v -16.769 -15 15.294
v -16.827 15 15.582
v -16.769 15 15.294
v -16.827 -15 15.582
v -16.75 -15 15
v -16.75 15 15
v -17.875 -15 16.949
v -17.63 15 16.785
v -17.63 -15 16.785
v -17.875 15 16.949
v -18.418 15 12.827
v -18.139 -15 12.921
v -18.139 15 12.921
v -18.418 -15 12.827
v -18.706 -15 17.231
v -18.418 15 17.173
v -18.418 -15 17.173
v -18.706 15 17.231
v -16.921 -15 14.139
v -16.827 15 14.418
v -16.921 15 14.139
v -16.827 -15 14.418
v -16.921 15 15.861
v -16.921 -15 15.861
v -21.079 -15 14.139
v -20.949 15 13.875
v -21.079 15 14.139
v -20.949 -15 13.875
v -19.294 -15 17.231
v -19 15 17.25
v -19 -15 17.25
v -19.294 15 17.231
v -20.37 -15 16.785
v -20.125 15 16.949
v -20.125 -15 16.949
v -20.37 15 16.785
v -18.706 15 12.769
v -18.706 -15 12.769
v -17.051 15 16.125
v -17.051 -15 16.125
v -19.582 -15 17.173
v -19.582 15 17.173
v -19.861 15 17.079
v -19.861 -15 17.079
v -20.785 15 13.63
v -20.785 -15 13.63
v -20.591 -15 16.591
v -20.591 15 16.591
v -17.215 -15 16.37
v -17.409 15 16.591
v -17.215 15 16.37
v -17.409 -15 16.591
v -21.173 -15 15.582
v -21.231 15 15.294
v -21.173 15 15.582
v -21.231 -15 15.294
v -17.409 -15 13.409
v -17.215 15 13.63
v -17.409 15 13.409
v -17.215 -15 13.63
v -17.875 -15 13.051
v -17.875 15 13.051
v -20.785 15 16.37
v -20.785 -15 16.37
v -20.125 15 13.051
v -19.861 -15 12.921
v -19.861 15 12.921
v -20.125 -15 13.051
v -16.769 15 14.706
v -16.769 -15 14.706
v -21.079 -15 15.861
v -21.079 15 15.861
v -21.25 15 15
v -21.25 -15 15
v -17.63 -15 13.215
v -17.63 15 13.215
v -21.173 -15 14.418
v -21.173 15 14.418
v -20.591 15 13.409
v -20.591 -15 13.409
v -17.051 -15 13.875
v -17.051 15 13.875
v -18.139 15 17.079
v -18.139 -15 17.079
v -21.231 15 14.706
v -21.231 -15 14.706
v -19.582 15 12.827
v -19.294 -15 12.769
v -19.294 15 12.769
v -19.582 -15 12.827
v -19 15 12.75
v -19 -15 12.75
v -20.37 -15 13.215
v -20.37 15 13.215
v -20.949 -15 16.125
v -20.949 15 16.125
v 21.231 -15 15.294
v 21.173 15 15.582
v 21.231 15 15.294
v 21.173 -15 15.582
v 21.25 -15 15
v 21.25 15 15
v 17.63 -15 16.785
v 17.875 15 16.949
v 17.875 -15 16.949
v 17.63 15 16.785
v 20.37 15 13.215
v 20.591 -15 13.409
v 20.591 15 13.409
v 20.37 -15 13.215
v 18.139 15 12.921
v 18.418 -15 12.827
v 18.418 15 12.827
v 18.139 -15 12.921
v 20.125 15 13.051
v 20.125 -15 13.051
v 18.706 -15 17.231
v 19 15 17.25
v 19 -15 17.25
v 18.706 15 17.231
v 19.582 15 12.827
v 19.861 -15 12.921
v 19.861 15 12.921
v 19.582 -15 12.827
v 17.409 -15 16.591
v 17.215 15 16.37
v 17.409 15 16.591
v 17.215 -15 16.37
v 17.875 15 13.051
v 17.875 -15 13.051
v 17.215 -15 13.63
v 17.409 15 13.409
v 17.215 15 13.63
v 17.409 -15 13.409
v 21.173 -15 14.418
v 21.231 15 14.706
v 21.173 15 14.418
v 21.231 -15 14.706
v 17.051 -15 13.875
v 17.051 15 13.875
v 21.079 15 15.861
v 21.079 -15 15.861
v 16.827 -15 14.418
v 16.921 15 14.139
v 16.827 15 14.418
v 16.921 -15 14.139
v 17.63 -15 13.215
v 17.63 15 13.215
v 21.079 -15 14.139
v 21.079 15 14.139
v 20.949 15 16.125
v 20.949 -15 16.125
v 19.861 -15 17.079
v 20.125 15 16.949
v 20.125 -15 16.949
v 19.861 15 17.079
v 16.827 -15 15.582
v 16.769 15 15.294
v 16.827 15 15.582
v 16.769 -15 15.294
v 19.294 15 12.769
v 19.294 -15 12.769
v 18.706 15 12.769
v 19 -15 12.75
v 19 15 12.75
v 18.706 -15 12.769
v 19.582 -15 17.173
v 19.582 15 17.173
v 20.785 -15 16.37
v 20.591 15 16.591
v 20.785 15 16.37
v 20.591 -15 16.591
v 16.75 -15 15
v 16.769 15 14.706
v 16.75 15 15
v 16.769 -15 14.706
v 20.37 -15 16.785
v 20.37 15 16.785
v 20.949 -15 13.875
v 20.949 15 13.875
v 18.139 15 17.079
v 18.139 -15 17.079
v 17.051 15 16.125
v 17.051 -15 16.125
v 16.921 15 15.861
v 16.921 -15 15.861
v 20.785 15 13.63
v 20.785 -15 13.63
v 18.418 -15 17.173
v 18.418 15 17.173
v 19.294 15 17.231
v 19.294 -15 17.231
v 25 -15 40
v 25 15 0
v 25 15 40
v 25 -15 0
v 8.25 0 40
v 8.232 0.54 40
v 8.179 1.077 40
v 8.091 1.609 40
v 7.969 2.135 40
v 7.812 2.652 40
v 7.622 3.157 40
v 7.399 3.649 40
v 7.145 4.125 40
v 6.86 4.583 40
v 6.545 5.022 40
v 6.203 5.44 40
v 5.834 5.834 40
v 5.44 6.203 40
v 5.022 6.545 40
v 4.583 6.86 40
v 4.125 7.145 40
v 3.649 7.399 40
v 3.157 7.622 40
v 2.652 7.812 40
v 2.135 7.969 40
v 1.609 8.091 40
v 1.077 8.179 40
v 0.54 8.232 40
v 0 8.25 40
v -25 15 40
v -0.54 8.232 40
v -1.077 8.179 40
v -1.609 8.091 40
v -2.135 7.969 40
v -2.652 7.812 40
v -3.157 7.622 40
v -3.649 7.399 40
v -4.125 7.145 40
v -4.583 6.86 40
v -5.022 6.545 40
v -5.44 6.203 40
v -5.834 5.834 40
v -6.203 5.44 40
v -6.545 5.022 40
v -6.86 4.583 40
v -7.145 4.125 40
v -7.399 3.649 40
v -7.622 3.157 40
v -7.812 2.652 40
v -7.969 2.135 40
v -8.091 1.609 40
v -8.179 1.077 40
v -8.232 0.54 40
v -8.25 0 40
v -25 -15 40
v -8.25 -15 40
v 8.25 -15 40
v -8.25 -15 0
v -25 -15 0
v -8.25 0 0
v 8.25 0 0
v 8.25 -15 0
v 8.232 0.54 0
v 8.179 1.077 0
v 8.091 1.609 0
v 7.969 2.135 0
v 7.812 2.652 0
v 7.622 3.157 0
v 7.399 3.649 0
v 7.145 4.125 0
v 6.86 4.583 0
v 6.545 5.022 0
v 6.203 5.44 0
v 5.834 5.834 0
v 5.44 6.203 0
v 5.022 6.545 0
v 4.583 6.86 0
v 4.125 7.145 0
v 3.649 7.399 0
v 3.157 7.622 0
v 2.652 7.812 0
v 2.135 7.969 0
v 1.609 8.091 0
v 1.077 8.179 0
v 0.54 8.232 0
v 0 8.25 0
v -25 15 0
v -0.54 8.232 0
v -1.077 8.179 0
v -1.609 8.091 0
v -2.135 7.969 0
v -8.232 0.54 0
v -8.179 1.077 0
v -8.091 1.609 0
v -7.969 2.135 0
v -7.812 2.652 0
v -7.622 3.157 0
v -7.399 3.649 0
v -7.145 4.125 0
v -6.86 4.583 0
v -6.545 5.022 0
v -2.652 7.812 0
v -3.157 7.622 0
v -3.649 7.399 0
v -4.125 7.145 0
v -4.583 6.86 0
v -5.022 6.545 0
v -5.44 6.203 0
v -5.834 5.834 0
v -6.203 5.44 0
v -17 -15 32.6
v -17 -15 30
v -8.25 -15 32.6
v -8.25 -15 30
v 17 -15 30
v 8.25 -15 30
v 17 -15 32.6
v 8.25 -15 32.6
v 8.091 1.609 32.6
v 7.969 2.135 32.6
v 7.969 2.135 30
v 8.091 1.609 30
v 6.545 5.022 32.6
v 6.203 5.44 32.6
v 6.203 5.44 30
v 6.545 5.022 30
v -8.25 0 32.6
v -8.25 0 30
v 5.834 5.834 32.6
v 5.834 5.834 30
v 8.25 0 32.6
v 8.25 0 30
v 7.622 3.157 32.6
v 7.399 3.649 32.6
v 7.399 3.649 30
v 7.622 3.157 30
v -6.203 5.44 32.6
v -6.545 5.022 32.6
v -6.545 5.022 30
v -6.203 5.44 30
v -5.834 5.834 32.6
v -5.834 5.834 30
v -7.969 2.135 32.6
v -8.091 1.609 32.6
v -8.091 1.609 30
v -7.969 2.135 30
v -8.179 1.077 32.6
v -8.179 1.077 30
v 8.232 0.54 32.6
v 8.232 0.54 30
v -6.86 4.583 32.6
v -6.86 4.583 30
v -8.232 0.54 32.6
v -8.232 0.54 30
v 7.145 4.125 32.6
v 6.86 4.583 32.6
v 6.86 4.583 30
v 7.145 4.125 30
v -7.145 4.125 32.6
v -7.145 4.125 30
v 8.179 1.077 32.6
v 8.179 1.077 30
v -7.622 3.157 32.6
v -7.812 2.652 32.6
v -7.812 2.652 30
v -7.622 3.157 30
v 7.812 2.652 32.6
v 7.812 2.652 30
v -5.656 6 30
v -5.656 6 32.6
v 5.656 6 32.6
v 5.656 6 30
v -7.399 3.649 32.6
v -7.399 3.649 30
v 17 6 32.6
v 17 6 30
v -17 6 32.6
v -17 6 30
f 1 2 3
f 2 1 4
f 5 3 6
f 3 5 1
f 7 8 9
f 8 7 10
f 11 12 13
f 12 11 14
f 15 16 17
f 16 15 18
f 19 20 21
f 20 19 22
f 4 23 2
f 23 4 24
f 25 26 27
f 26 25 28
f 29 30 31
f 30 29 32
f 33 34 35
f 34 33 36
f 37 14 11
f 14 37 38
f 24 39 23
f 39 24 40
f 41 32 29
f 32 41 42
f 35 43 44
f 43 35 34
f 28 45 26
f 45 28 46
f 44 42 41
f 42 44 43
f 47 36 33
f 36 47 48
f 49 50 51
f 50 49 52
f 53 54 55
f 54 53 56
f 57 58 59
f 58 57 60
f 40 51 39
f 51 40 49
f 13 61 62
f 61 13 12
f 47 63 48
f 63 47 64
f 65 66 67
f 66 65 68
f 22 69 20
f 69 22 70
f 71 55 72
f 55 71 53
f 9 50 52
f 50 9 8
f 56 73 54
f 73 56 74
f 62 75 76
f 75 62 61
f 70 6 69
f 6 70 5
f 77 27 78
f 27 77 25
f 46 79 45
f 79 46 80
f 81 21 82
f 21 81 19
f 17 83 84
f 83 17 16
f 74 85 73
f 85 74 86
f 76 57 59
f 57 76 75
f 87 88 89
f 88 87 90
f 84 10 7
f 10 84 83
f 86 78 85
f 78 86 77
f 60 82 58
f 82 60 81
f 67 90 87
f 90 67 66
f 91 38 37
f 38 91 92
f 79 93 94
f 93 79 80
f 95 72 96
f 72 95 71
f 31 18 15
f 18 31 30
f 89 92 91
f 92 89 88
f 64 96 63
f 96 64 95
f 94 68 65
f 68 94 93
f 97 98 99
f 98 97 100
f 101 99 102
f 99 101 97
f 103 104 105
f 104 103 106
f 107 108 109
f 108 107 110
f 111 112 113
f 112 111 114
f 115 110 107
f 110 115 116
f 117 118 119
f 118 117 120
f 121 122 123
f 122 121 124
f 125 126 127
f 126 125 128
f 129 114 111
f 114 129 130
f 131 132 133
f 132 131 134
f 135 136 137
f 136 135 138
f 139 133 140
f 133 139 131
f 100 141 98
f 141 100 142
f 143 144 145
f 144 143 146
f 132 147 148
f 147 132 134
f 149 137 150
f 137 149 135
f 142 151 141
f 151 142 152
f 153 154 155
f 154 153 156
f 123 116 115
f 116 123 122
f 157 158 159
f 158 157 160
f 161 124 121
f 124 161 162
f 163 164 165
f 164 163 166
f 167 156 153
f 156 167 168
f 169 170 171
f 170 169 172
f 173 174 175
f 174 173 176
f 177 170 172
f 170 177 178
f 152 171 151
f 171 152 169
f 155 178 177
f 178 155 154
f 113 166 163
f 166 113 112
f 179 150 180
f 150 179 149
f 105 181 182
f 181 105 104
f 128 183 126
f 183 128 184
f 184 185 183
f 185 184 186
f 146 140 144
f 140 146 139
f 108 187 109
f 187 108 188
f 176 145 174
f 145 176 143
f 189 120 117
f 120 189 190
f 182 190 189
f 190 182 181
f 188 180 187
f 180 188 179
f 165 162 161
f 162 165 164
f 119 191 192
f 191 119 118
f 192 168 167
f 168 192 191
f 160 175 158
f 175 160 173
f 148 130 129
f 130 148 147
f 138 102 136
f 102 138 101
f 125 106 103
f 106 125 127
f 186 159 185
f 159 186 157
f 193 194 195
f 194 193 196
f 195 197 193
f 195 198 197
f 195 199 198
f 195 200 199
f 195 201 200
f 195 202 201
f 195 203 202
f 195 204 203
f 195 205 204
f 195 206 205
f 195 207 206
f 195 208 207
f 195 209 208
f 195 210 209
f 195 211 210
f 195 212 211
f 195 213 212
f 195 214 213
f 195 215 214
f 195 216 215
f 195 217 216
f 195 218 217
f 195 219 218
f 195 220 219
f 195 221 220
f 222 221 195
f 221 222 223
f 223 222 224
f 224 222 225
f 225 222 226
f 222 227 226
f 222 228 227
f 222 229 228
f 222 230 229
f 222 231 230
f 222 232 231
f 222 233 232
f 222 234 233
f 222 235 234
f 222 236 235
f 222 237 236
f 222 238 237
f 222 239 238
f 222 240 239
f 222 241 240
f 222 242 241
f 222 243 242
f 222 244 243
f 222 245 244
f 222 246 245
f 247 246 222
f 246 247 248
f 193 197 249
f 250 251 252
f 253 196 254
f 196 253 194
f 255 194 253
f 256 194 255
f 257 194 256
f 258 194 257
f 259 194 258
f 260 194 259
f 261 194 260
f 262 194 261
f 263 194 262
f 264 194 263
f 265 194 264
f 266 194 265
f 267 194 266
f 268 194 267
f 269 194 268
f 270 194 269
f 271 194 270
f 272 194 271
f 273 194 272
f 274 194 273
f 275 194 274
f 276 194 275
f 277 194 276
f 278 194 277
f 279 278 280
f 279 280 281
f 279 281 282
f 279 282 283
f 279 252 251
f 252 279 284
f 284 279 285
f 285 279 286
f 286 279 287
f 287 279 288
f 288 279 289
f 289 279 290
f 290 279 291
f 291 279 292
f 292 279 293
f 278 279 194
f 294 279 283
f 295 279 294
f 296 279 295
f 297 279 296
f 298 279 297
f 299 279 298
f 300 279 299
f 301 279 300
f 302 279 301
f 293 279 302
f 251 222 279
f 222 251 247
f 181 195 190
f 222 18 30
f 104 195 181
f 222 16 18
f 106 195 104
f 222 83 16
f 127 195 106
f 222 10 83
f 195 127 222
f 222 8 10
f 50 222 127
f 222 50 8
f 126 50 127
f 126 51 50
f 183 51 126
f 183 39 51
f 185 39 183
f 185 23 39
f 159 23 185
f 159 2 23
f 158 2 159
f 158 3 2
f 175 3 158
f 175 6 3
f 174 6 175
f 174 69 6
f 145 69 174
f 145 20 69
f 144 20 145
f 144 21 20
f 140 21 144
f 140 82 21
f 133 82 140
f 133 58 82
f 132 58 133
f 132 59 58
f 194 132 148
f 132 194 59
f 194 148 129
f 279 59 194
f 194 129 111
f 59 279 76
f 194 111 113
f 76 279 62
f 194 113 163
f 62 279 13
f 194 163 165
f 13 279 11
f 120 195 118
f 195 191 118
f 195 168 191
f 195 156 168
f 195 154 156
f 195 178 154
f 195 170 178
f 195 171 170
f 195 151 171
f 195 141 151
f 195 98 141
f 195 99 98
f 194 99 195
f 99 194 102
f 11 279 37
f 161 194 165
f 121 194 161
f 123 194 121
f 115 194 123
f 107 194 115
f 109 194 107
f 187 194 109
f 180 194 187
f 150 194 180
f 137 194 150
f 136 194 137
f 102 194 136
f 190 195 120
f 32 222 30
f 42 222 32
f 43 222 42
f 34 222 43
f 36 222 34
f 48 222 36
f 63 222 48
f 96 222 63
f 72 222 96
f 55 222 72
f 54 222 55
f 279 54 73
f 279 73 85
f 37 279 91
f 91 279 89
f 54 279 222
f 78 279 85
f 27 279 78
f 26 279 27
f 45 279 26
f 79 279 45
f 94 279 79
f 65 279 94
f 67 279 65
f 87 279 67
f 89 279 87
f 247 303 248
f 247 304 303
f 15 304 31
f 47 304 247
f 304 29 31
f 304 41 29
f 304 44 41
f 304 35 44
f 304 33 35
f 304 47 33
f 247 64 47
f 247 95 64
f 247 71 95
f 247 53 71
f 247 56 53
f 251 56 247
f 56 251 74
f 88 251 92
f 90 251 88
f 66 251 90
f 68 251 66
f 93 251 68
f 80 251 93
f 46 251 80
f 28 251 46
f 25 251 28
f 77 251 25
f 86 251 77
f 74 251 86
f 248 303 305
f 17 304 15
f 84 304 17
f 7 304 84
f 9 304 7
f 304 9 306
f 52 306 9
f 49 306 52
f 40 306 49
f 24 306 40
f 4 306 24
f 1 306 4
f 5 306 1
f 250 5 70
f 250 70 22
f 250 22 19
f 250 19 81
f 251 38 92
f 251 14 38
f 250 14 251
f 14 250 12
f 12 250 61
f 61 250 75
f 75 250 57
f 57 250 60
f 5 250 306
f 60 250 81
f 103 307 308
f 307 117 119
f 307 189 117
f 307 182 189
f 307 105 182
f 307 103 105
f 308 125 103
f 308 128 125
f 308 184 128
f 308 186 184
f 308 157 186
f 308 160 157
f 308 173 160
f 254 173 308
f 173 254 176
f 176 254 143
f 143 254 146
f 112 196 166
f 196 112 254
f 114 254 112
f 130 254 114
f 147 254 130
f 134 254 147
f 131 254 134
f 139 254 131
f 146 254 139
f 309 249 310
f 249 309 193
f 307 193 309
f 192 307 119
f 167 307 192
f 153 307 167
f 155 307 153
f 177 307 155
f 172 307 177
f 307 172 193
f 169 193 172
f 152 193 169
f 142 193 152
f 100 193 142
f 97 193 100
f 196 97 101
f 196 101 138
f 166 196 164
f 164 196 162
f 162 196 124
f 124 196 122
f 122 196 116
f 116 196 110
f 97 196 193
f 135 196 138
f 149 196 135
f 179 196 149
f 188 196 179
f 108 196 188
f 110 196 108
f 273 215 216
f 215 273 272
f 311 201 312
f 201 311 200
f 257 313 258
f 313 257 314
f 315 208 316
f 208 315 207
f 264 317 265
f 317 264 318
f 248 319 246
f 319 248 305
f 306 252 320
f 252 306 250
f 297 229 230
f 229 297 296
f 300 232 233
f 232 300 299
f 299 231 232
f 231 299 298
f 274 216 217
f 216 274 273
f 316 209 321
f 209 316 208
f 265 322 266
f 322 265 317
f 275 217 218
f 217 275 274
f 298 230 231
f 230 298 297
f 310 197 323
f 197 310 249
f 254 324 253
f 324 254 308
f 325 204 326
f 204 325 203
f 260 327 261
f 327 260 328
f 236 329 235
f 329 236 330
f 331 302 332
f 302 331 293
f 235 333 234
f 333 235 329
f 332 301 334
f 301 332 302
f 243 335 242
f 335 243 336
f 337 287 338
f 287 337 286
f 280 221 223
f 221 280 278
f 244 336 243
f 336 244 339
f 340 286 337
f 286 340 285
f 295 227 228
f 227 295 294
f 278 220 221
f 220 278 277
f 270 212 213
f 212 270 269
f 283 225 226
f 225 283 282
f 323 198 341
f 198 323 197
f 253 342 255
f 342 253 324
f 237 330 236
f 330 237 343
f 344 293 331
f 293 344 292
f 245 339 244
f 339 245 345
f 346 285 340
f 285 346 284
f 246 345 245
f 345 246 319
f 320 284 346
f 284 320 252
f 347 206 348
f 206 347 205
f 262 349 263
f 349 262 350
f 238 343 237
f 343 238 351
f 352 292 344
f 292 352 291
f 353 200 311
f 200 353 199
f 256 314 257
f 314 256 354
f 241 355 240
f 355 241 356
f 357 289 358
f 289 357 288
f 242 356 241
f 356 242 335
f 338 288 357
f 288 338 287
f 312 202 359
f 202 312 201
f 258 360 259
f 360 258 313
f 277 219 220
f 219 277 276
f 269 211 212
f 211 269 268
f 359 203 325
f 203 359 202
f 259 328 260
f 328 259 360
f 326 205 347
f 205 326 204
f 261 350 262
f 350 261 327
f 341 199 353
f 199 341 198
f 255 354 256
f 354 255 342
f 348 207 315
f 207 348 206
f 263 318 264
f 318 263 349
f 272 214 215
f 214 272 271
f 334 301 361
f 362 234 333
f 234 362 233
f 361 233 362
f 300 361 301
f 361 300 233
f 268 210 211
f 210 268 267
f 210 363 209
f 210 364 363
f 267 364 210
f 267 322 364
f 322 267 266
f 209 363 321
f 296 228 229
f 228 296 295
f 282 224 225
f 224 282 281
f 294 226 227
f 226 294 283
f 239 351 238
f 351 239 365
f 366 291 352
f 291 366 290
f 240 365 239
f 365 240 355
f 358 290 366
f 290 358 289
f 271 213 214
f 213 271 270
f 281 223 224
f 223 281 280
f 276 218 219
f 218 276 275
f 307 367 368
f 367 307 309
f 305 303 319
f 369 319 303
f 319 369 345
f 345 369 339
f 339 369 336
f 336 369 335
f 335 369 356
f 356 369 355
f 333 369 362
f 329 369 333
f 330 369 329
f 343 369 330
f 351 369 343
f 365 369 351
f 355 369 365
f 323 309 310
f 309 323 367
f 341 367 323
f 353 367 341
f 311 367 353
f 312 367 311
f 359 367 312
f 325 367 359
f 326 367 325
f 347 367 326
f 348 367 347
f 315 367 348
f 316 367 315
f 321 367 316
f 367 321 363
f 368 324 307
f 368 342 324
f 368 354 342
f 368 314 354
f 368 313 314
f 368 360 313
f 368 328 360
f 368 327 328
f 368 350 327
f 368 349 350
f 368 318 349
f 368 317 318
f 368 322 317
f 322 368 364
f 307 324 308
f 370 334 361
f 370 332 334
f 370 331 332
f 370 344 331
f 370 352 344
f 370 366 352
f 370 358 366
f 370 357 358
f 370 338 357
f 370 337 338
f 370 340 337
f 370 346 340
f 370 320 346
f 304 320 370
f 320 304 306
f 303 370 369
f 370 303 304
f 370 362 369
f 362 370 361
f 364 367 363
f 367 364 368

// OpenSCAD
// KNOWN-WRONG PART (must fail): the flange slot reaches back only to y = 6
// Wall-mounted holder for a 10 mL syringe hanging upright, tip down (gravity-feed reservoir)
// Category: hardware. A block with a vertical U-shaped barrel channel open at the front, a
// horizontal slot that takes the finger flange, and two M4 wall-screw holes from front to back.
// Print: PETG or PLA, standing on its bottom face; the flange slot roof bridges 34 mm.
// SPDX-License-Identifier: CERN-OHL-P-2.0

/* [Holder] */
block = [50, 30, 40];     // X (width), Y (depth), Z (height) [mm]; back face at y = +15
channel_w = 16.5;         // 16 mm barrel + clearance; half-circle back end centred at (0, 0)
slot = [34, 2.6];         // flange slot width (X) and height (Z)
slot_z = 30;              // slot from z = 30 to 32.6
slot_back_y = 6;          // the slot reaches from the front face back to y = 11
screw_d = 4.5;            // M4 clearance
screw_x = 19;
screw_z = 15;

/* [Hidden] */
eps = 0.01;

difference() {
    translate([-block.x / 2, -block.y / 2, 0]) cube(block);
    // barrel channel, open toward -Y (the front)
    translate([0, 0, -1]) linear_extrude(block.z + 2) {
        circle(d = channel_w, $fn = 96);
        translate([-channel_w / 2, -block.y / 2 - 1]) square([channel_w, block.y / 2 + 1]);
    }
    // flange slot, cut in from the front face
    translate([-slot.x / 2, -block.y / 2 - 1, slot_z]) cube([slot.x, slot_back_y + block.y / 2 + 1, slot.y]);
    // wall-screw holes, front to back
    for (s = [-1, 1])
        translate([s * screw_x, 0, screw_z]) rotate([90, 0, 0])
            cylinder(d = screw_d, h = block.y + 2, center = true, $fn = 48);
}
